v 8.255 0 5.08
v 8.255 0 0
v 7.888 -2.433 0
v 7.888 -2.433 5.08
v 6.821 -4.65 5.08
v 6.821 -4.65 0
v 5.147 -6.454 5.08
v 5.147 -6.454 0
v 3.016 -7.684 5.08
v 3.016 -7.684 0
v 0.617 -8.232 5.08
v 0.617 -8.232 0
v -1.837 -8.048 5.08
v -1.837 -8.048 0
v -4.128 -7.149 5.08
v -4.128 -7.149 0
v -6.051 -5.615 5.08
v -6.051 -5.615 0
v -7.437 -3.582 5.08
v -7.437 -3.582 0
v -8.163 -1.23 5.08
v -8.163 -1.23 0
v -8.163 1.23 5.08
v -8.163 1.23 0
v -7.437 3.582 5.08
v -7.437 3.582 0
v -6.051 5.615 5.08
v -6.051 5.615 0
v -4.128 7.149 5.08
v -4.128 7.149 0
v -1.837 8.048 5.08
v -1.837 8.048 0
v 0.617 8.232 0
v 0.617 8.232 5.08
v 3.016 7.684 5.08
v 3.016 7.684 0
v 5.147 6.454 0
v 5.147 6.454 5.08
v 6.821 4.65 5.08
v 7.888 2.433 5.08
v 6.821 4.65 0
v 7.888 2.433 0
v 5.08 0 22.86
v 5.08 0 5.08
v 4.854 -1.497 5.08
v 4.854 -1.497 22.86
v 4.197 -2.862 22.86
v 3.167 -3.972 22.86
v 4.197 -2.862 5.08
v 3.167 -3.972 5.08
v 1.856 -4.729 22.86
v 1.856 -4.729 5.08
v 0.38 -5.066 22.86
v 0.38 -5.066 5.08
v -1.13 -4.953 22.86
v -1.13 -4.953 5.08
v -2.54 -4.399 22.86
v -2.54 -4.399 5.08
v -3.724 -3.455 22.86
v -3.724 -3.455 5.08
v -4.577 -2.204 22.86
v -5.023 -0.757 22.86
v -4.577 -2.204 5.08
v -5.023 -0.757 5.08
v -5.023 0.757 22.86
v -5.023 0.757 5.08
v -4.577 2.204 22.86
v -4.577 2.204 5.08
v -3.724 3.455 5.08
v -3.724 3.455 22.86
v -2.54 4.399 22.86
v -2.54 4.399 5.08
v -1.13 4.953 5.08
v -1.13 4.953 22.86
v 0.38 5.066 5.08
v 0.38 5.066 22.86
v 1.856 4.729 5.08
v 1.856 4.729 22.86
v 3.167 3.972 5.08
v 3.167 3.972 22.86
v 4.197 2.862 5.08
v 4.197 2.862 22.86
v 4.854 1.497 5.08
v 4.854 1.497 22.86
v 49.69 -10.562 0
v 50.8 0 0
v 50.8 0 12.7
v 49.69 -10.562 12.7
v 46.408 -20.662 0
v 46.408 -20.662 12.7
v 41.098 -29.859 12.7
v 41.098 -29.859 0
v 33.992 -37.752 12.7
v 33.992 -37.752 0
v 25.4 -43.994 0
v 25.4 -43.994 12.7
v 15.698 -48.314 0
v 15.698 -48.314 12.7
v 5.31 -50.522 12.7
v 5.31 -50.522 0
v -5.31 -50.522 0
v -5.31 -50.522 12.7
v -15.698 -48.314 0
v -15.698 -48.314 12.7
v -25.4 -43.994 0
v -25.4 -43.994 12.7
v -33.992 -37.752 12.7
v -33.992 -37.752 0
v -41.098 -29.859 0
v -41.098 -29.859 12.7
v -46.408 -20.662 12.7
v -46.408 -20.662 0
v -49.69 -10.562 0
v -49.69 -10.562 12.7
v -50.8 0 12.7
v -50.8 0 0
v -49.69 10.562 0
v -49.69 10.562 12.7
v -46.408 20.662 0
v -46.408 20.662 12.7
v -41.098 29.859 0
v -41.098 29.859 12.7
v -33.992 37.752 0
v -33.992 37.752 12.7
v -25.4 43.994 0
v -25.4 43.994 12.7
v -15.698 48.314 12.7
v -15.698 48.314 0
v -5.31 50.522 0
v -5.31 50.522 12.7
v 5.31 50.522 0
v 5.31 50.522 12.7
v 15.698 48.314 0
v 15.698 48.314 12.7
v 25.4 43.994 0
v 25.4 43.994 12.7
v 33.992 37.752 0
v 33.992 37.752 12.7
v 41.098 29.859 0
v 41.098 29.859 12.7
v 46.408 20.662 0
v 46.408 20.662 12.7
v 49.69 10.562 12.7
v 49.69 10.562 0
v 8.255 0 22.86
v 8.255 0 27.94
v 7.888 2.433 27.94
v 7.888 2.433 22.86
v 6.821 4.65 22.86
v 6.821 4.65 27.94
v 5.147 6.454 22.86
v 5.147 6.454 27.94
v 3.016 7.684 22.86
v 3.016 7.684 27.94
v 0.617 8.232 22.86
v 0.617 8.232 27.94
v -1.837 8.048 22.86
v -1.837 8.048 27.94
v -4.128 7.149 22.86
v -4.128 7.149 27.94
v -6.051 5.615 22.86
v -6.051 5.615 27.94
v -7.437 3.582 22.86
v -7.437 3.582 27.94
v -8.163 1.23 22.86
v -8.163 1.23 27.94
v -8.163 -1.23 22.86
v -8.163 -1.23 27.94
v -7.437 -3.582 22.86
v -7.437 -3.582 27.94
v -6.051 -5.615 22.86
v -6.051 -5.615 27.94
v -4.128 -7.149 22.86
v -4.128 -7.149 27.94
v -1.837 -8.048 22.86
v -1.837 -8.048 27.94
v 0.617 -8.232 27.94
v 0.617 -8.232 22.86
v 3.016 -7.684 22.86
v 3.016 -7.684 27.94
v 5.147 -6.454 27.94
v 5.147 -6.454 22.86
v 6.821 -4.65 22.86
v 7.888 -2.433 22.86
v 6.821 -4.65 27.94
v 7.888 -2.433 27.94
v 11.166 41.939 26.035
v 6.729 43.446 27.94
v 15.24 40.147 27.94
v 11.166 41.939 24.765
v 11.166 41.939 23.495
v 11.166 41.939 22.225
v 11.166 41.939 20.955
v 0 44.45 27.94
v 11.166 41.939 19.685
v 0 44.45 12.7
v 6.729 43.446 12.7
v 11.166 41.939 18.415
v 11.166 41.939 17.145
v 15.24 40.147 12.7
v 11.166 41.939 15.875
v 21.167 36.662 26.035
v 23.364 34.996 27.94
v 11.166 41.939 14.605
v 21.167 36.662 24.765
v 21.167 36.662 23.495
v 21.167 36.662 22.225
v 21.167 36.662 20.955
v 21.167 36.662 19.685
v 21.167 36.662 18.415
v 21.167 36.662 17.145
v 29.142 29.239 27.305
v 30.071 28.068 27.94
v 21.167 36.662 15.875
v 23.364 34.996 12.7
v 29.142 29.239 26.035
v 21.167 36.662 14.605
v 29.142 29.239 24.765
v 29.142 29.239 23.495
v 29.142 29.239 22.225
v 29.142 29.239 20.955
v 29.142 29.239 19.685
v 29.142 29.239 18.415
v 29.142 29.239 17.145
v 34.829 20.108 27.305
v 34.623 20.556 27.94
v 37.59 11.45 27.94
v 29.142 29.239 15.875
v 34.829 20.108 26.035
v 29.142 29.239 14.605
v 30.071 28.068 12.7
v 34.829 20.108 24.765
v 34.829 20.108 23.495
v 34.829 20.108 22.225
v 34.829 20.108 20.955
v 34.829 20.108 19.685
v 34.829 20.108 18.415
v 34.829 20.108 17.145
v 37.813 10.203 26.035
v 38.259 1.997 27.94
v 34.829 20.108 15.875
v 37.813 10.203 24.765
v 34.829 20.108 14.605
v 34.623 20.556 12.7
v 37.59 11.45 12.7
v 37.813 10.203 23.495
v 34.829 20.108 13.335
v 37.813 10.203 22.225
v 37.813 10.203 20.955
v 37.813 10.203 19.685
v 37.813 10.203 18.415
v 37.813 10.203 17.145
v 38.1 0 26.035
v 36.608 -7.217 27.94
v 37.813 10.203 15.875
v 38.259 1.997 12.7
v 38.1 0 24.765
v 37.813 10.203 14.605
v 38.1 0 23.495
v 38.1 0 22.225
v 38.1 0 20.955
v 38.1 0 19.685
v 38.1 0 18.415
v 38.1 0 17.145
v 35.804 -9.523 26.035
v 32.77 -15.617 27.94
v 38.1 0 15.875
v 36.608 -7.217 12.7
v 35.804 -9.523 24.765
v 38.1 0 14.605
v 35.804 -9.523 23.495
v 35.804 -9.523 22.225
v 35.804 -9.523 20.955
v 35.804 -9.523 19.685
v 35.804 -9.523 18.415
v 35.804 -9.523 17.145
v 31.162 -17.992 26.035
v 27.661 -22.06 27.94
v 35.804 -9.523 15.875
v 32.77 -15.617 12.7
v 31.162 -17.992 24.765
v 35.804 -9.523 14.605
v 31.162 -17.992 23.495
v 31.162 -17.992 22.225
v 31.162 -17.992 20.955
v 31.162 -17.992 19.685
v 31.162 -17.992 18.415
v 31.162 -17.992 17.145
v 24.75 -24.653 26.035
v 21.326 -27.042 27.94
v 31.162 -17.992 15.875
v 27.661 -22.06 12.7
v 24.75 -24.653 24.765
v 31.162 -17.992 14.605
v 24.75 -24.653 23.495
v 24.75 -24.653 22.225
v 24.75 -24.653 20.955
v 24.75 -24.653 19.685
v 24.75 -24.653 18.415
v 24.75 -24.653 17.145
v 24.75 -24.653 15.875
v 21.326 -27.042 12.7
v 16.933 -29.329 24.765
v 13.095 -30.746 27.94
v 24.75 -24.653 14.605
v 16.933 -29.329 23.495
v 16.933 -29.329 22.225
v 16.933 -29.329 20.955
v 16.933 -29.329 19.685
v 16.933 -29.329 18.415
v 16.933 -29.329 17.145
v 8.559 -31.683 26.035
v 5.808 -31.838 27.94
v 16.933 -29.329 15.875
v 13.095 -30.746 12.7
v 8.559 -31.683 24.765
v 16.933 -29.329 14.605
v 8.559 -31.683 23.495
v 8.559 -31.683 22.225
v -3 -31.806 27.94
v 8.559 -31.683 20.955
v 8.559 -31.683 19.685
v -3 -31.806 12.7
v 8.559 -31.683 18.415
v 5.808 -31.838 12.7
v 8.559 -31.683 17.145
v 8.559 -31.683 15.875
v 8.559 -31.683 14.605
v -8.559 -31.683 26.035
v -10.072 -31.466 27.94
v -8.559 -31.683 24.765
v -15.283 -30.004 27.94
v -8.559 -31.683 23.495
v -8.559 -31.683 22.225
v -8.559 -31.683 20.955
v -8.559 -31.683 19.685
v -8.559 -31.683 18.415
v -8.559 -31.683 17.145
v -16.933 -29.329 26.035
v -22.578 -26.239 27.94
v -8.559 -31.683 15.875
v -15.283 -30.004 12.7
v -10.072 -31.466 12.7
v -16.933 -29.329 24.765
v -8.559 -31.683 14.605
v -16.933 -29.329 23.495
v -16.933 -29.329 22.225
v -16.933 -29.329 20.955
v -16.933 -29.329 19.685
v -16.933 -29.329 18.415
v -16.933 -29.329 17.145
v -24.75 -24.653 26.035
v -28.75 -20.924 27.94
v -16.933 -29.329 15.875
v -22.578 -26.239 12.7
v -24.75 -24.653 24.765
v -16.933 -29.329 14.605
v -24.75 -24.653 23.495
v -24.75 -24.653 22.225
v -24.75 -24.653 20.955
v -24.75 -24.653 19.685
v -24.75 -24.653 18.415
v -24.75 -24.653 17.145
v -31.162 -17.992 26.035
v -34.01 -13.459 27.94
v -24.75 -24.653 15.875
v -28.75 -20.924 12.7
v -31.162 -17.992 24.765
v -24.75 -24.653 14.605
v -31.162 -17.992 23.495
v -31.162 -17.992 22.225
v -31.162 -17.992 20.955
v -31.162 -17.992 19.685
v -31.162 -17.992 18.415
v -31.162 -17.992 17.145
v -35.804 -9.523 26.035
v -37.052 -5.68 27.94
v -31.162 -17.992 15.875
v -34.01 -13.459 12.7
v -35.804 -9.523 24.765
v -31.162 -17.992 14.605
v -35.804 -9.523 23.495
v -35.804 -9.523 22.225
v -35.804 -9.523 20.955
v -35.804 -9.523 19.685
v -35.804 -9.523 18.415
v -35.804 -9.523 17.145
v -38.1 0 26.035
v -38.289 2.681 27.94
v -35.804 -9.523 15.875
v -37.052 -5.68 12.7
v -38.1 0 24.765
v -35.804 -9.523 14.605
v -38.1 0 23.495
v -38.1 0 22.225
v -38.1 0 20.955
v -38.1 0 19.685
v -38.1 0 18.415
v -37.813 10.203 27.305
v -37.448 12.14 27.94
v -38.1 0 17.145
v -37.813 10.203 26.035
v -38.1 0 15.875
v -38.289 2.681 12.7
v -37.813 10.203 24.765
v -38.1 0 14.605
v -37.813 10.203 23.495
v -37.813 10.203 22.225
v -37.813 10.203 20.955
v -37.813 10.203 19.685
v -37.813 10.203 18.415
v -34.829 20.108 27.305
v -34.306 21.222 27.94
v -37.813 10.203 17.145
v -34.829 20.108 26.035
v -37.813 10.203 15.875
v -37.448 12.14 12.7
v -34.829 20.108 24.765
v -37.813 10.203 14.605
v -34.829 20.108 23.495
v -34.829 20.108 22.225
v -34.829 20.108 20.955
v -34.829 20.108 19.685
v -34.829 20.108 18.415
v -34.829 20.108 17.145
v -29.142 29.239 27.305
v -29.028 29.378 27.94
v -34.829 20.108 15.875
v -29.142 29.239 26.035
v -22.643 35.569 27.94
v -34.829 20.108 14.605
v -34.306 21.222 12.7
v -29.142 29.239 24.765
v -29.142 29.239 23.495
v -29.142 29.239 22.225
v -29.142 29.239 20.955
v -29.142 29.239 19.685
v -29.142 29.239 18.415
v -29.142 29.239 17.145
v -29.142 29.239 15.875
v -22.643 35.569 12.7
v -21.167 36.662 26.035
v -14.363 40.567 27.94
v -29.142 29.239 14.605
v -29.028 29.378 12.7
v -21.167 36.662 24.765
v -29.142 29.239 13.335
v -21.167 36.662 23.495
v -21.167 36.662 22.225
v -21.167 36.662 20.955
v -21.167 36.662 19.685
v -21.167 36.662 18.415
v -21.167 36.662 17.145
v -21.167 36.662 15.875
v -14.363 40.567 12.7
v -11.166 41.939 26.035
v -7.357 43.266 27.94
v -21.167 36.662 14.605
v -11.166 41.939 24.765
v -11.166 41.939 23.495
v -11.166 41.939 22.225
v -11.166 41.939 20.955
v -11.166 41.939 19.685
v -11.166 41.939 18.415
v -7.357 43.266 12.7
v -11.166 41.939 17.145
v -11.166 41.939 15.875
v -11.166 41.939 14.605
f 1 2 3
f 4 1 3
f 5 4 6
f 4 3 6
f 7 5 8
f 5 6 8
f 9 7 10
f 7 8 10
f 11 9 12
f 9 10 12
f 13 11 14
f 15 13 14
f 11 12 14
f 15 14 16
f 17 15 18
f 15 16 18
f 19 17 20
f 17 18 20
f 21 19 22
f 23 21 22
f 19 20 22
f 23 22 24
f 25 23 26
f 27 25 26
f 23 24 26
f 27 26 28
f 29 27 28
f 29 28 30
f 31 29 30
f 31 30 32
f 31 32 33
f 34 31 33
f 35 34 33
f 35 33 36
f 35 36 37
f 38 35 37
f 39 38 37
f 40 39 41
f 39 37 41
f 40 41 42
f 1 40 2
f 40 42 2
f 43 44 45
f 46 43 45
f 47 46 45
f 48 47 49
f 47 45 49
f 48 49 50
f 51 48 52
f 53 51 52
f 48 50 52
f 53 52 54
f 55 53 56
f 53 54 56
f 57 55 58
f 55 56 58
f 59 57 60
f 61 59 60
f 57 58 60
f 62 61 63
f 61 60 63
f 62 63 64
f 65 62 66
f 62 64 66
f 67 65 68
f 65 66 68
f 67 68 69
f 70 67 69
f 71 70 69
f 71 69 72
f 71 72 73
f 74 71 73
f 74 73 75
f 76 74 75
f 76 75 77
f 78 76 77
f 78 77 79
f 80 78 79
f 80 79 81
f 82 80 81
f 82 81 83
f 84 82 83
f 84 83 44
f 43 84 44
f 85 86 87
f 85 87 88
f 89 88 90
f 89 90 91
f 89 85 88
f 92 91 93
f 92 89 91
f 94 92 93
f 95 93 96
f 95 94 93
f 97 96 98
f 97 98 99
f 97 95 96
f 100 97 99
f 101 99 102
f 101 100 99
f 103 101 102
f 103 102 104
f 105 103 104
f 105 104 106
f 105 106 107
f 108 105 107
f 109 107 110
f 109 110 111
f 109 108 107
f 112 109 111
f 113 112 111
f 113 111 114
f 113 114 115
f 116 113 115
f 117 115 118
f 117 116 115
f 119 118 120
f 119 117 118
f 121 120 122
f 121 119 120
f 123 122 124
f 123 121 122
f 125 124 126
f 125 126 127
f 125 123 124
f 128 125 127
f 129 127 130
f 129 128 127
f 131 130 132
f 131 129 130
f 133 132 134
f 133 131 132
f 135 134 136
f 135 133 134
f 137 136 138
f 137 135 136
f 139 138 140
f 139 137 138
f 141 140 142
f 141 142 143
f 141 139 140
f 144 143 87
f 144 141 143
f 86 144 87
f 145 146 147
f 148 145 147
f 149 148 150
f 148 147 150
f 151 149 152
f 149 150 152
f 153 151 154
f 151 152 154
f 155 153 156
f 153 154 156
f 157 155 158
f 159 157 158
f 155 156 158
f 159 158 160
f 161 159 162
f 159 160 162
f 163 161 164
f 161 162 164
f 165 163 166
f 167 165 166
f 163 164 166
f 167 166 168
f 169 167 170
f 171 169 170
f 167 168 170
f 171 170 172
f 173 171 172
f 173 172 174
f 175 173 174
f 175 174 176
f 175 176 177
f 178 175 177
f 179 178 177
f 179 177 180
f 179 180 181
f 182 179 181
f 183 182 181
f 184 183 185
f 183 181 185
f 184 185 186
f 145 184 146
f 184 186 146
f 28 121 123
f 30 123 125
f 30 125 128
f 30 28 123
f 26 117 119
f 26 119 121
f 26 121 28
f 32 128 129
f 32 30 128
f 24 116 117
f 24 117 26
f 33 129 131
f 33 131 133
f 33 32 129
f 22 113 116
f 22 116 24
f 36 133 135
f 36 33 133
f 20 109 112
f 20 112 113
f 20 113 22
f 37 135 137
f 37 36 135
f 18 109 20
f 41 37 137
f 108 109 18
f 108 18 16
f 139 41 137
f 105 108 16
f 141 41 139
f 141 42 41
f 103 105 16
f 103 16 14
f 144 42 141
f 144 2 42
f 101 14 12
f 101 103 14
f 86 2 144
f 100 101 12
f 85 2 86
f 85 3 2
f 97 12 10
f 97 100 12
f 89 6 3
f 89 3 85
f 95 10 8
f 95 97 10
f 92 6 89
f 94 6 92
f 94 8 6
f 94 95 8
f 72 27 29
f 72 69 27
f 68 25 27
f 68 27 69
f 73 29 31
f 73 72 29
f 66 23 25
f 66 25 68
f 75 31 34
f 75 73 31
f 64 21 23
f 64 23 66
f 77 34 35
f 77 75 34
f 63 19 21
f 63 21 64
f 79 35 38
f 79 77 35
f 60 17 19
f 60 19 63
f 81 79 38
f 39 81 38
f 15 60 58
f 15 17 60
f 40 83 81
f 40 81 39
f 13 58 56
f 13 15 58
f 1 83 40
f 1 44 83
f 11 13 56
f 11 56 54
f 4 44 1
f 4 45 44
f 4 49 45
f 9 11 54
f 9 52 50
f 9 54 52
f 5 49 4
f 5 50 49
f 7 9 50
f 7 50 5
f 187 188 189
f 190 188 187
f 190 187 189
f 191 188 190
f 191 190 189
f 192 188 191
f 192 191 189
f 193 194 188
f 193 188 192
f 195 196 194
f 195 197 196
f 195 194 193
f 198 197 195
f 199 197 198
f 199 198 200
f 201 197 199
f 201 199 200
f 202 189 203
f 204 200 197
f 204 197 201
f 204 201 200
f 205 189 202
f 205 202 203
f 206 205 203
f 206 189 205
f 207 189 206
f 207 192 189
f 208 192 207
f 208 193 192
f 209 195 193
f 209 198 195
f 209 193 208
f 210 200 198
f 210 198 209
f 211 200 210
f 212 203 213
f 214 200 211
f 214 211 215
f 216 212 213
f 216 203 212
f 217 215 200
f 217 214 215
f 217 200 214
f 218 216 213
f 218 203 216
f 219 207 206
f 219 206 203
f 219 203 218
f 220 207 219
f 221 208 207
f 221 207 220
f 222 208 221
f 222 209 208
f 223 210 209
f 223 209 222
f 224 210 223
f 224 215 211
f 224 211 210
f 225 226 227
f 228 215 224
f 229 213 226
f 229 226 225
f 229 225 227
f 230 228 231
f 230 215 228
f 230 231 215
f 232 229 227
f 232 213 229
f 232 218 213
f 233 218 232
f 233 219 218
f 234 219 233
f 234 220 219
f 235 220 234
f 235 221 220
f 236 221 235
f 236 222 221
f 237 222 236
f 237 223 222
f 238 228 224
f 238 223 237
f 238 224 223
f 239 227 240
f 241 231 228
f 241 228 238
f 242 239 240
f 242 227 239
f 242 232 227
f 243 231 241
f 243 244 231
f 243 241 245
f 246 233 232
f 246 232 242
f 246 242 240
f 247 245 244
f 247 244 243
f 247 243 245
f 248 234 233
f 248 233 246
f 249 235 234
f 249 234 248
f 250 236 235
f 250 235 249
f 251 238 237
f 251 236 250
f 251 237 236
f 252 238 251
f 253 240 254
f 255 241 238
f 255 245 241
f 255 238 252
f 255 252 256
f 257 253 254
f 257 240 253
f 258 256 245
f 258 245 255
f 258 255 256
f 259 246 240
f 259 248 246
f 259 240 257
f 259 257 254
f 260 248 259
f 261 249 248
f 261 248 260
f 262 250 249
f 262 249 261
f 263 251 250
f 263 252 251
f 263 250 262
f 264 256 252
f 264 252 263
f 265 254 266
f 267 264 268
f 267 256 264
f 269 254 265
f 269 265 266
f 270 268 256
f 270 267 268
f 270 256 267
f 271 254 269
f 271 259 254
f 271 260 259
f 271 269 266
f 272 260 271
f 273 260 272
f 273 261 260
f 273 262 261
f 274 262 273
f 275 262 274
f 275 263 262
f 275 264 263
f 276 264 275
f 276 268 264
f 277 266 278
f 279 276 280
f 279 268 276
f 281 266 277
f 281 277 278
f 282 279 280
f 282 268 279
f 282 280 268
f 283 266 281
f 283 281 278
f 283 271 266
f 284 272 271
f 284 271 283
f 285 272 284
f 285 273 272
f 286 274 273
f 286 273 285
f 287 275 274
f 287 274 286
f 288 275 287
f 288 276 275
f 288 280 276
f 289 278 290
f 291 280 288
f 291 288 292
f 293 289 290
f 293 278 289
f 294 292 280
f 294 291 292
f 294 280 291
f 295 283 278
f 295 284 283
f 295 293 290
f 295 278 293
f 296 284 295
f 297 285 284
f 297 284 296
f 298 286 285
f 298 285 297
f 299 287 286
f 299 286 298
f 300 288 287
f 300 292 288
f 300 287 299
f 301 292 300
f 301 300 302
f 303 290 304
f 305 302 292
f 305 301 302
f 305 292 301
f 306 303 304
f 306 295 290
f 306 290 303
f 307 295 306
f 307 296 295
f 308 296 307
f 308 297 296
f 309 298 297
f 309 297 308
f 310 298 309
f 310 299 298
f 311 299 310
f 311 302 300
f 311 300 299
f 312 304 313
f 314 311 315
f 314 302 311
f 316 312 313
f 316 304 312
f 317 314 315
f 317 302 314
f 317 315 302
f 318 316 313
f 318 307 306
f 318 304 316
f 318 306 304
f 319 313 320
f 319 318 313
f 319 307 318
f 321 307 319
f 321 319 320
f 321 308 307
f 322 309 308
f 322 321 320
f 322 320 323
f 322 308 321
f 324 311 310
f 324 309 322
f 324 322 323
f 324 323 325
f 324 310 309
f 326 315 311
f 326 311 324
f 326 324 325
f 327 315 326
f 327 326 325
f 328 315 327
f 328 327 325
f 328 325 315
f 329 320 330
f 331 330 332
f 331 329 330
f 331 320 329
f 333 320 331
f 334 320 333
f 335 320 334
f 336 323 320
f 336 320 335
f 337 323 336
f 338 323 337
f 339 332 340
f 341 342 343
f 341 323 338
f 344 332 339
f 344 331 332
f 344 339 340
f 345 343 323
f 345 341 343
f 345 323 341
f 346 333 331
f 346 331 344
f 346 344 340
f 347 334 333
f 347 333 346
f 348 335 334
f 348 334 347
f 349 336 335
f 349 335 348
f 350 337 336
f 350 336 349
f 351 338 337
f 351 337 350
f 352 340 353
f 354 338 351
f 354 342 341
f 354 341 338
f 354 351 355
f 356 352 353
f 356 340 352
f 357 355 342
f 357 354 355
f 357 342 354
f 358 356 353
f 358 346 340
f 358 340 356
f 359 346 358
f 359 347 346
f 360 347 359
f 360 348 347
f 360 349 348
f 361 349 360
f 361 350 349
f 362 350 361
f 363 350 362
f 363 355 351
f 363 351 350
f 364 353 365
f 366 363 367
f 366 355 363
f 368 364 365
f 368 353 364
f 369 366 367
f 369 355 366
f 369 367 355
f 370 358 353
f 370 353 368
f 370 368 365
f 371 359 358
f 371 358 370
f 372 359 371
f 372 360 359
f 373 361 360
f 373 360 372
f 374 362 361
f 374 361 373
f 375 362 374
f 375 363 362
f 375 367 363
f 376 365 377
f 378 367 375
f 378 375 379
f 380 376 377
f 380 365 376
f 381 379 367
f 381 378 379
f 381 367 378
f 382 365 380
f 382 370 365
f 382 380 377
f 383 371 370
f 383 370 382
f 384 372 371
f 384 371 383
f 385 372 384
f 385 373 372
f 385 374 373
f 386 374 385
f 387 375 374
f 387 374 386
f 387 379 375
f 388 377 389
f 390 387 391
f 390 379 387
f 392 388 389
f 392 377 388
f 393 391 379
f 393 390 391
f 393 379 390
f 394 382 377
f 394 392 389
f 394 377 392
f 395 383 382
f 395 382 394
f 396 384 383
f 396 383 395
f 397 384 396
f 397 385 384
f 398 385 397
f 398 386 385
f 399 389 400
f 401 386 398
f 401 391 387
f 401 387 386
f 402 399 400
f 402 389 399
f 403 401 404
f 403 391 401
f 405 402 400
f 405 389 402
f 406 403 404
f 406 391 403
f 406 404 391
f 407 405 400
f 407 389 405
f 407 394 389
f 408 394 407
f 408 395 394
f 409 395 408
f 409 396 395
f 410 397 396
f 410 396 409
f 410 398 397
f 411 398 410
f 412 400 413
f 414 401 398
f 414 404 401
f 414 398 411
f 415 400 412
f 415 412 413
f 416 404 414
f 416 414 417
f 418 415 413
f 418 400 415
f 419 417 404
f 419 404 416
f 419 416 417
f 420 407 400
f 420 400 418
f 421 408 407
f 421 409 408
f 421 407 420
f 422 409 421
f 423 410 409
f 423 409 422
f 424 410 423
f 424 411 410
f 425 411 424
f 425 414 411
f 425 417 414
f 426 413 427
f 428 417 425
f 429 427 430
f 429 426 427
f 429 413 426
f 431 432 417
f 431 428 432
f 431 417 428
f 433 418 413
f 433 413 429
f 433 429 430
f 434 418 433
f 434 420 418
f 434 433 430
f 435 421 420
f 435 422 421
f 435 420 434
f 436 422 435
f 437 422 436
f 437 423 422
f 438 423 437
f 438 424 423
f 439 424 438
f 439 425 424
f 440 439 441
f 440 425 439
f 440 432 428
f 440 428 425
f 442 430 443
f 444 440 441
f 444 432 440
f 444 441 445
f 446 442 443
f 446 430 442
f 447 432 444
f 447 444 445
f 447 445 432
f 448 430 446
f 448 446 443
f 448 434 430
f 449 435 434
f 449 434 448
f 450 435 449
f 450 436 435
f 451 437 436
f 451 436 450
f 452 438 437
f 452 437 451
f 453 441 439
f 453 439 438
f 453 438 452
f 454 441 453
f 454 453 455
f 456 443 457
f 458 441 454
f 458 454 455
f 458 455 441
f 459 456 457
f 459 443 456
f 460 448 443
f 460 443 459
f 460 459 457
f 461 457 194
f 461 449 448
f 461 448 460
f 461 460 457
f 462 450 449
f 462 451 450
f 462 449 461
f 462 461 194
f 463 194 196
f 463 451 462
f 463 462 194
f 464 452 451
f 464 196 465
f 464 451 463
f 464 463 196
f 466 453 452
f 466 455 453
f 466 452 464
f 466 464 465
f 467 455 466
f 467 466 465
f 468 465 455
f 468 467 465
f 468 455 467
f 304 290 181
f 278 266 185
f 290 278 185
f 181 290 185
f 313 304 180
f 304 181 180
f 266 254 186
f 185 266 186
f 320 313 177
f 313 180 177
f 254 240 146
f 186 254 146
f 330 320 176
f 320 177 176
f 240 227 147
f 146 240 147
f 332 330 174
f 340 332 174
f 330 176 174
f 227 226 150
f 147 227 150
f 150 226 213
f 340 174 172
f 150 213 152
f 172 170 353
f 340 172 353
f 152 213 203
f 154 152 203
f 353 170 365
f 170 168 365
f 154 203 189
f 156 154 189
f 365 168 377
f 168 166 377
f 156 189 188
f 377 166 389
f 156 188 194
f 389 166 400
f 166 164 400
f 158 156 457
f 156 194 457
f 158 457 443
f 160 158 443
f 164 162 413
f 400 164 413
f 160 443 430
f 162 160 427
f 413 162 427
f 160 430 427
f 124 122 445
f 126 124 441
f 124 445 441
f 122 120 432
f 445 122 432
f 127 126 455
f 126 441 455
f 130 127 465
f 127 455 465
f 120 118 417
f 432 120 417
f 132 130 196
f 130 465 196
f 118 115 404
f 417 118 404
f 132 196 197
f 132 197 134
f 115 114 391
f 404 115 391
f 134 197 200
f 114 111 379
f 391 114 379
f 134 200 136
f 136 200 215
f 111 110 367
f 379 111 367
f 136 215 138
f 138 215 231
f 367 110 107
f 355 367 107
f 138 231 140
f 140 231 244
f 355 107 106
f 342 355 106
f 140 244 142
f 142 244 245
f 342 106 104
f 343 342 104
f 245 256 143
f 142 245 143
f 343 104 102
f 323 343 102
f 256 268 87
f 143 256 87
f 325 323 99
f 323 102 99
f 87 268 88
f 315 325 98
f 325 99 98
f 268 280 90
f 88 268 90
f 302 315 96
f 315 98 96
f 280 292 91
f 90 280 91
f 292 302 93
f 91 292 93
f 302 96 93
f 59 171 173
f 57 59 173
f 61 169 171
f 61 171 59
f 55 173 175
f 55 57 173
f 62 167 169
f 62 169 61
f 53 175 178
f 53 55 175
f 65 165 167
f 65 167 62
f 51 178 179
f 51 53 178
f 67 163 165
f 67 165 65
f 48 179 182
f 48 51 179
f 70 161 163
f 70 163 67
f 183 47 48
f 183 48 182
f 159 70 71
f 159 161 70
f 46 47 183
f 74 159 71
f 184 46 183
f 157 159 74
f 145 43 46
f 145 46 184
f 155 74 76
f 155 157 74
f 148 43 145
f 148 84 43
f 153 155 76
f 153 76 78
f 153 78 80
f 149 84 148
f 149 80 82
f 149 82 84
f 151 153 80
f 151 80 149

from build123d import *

# Parameters (mm, degrees)
F0_R      = 44.45
F1_DEPTH  = 12.7
F5_DEPTH  = 15.24
F6_R      = 5.08
F7_DEPTH  = 27.9410001
F8_R      = 50.8
F8_R_2    = 44.45
F9_DEPTH  = 12.7
F10_R     = 8.255
F11_DEPTH = 5.08
F12_R     = 8.255
F13_DEPTH = 5.08


with BuildPart() as f1:
    # F0 (on Top) → F1 (new body)
    with BuildSketch(Plane.XY):
        Circle(F0_R)
    extrude(amount=F1_DEPTH)

    # F4 (on face) → F5 (join)
    with BuildSketch(Plane.XY.offset(12.7)):
        with BuildLine():
            add(Edge.make_bspline(
                [(0, 44.45), (3.8161622768, 44.45), (11.4026198726, 42.2339028191), (21.4291073523, 37.118983182), (29.5441568439, 29.4978435068), (35.2464971495, 20.3249657359), (38.2717968038, 10.2291283802), (38.5450602767, -0.0236397411), (36.1914928493, -9.7235011377), (31.5155163655, -18.2197270955), (24.9664771709, -25.01482225), (17.1162591598, -29.6396275034), (8.5482860936, -32.2367039327), (0, -31.508581644), (-8.5482860936, -32.2367039327), (-17.1162591598, -29.6396275034), (-24.9664771709, -25.01482225), (-31.5155163655, -18.2197270955), (-36.1914928493, -9.7235011377), (-38.5450602767, -0.0236397411), (-38.2717968038, 10.2291283802), (-35.2464971495, 20.3249657359), (-29.5441568439, 29.4978435068), (-21.4291073523, 37.118983182), (-11.4026198726, 42.2339028191), (-3.8161622768, 44.45), (0, 44.45)],
                knots=[0, 0, 0, 0, 0.0447553696, 0.0889728186, 0.1326458397, 0.1757676888, 0.2183313697, 0.2603296192, 0.3017548895, 0.3425993302, 0.3828547676, 0.422512683, 0.4615641884, 0.5, 0.5384358116, 0.577487317, 0.6171452324, 0.6574006698, 0.6982451105, 0.7396703808, 0.7816686303, 0.8242323112, 0.8673541603, 0.9110271814, 0.9552446304, 1, 1, 1, 1], degree=3))
        make_face()
    extrude(amount=F5_DEPTH)

    # F6 (on face) → F7 (cut, through all)
    with BuildSketch(Plane(origin=(0, 0, 0), x_dir=(1, 0, 0), z_dir=(0, 0, -1))):
        Circle(F6_R)
    extrude(amount=-F7_DEPTH, mode=Mode.SUBTRACT)

    # F8 (on face) → F9 (join, through all)
    with BuildSketch(Plane(origin=(0, 0, 0), x_dir=(1, 0, 0), z_dir=(0, 0, -1))):
        Circle(F8_R)
        Circle(F8_R_2, mode=Mode.SUBTRACT)
    extrude(amount=-F9_DEPTH)

    # F10 (on face) → F11 (cut)
    with BuildSketch(Plane(origin=(0, 0, 0), x_dir=(1, 0, 0), z_dir=(0, 0, -1))):
        Circle(F10_R)
    extrude(amount=-F11_DEPTH, mode=Mode.SUBTRACT)

    # F12 (on face) → F13 (cut)
    with BuildSketch(Plane.XY.offset(27.94)):
        Circle(F12_R)
    extrude(amount=-F13_DEPTH, mode=Mode.SUBTRACT)


solid = f1.part
